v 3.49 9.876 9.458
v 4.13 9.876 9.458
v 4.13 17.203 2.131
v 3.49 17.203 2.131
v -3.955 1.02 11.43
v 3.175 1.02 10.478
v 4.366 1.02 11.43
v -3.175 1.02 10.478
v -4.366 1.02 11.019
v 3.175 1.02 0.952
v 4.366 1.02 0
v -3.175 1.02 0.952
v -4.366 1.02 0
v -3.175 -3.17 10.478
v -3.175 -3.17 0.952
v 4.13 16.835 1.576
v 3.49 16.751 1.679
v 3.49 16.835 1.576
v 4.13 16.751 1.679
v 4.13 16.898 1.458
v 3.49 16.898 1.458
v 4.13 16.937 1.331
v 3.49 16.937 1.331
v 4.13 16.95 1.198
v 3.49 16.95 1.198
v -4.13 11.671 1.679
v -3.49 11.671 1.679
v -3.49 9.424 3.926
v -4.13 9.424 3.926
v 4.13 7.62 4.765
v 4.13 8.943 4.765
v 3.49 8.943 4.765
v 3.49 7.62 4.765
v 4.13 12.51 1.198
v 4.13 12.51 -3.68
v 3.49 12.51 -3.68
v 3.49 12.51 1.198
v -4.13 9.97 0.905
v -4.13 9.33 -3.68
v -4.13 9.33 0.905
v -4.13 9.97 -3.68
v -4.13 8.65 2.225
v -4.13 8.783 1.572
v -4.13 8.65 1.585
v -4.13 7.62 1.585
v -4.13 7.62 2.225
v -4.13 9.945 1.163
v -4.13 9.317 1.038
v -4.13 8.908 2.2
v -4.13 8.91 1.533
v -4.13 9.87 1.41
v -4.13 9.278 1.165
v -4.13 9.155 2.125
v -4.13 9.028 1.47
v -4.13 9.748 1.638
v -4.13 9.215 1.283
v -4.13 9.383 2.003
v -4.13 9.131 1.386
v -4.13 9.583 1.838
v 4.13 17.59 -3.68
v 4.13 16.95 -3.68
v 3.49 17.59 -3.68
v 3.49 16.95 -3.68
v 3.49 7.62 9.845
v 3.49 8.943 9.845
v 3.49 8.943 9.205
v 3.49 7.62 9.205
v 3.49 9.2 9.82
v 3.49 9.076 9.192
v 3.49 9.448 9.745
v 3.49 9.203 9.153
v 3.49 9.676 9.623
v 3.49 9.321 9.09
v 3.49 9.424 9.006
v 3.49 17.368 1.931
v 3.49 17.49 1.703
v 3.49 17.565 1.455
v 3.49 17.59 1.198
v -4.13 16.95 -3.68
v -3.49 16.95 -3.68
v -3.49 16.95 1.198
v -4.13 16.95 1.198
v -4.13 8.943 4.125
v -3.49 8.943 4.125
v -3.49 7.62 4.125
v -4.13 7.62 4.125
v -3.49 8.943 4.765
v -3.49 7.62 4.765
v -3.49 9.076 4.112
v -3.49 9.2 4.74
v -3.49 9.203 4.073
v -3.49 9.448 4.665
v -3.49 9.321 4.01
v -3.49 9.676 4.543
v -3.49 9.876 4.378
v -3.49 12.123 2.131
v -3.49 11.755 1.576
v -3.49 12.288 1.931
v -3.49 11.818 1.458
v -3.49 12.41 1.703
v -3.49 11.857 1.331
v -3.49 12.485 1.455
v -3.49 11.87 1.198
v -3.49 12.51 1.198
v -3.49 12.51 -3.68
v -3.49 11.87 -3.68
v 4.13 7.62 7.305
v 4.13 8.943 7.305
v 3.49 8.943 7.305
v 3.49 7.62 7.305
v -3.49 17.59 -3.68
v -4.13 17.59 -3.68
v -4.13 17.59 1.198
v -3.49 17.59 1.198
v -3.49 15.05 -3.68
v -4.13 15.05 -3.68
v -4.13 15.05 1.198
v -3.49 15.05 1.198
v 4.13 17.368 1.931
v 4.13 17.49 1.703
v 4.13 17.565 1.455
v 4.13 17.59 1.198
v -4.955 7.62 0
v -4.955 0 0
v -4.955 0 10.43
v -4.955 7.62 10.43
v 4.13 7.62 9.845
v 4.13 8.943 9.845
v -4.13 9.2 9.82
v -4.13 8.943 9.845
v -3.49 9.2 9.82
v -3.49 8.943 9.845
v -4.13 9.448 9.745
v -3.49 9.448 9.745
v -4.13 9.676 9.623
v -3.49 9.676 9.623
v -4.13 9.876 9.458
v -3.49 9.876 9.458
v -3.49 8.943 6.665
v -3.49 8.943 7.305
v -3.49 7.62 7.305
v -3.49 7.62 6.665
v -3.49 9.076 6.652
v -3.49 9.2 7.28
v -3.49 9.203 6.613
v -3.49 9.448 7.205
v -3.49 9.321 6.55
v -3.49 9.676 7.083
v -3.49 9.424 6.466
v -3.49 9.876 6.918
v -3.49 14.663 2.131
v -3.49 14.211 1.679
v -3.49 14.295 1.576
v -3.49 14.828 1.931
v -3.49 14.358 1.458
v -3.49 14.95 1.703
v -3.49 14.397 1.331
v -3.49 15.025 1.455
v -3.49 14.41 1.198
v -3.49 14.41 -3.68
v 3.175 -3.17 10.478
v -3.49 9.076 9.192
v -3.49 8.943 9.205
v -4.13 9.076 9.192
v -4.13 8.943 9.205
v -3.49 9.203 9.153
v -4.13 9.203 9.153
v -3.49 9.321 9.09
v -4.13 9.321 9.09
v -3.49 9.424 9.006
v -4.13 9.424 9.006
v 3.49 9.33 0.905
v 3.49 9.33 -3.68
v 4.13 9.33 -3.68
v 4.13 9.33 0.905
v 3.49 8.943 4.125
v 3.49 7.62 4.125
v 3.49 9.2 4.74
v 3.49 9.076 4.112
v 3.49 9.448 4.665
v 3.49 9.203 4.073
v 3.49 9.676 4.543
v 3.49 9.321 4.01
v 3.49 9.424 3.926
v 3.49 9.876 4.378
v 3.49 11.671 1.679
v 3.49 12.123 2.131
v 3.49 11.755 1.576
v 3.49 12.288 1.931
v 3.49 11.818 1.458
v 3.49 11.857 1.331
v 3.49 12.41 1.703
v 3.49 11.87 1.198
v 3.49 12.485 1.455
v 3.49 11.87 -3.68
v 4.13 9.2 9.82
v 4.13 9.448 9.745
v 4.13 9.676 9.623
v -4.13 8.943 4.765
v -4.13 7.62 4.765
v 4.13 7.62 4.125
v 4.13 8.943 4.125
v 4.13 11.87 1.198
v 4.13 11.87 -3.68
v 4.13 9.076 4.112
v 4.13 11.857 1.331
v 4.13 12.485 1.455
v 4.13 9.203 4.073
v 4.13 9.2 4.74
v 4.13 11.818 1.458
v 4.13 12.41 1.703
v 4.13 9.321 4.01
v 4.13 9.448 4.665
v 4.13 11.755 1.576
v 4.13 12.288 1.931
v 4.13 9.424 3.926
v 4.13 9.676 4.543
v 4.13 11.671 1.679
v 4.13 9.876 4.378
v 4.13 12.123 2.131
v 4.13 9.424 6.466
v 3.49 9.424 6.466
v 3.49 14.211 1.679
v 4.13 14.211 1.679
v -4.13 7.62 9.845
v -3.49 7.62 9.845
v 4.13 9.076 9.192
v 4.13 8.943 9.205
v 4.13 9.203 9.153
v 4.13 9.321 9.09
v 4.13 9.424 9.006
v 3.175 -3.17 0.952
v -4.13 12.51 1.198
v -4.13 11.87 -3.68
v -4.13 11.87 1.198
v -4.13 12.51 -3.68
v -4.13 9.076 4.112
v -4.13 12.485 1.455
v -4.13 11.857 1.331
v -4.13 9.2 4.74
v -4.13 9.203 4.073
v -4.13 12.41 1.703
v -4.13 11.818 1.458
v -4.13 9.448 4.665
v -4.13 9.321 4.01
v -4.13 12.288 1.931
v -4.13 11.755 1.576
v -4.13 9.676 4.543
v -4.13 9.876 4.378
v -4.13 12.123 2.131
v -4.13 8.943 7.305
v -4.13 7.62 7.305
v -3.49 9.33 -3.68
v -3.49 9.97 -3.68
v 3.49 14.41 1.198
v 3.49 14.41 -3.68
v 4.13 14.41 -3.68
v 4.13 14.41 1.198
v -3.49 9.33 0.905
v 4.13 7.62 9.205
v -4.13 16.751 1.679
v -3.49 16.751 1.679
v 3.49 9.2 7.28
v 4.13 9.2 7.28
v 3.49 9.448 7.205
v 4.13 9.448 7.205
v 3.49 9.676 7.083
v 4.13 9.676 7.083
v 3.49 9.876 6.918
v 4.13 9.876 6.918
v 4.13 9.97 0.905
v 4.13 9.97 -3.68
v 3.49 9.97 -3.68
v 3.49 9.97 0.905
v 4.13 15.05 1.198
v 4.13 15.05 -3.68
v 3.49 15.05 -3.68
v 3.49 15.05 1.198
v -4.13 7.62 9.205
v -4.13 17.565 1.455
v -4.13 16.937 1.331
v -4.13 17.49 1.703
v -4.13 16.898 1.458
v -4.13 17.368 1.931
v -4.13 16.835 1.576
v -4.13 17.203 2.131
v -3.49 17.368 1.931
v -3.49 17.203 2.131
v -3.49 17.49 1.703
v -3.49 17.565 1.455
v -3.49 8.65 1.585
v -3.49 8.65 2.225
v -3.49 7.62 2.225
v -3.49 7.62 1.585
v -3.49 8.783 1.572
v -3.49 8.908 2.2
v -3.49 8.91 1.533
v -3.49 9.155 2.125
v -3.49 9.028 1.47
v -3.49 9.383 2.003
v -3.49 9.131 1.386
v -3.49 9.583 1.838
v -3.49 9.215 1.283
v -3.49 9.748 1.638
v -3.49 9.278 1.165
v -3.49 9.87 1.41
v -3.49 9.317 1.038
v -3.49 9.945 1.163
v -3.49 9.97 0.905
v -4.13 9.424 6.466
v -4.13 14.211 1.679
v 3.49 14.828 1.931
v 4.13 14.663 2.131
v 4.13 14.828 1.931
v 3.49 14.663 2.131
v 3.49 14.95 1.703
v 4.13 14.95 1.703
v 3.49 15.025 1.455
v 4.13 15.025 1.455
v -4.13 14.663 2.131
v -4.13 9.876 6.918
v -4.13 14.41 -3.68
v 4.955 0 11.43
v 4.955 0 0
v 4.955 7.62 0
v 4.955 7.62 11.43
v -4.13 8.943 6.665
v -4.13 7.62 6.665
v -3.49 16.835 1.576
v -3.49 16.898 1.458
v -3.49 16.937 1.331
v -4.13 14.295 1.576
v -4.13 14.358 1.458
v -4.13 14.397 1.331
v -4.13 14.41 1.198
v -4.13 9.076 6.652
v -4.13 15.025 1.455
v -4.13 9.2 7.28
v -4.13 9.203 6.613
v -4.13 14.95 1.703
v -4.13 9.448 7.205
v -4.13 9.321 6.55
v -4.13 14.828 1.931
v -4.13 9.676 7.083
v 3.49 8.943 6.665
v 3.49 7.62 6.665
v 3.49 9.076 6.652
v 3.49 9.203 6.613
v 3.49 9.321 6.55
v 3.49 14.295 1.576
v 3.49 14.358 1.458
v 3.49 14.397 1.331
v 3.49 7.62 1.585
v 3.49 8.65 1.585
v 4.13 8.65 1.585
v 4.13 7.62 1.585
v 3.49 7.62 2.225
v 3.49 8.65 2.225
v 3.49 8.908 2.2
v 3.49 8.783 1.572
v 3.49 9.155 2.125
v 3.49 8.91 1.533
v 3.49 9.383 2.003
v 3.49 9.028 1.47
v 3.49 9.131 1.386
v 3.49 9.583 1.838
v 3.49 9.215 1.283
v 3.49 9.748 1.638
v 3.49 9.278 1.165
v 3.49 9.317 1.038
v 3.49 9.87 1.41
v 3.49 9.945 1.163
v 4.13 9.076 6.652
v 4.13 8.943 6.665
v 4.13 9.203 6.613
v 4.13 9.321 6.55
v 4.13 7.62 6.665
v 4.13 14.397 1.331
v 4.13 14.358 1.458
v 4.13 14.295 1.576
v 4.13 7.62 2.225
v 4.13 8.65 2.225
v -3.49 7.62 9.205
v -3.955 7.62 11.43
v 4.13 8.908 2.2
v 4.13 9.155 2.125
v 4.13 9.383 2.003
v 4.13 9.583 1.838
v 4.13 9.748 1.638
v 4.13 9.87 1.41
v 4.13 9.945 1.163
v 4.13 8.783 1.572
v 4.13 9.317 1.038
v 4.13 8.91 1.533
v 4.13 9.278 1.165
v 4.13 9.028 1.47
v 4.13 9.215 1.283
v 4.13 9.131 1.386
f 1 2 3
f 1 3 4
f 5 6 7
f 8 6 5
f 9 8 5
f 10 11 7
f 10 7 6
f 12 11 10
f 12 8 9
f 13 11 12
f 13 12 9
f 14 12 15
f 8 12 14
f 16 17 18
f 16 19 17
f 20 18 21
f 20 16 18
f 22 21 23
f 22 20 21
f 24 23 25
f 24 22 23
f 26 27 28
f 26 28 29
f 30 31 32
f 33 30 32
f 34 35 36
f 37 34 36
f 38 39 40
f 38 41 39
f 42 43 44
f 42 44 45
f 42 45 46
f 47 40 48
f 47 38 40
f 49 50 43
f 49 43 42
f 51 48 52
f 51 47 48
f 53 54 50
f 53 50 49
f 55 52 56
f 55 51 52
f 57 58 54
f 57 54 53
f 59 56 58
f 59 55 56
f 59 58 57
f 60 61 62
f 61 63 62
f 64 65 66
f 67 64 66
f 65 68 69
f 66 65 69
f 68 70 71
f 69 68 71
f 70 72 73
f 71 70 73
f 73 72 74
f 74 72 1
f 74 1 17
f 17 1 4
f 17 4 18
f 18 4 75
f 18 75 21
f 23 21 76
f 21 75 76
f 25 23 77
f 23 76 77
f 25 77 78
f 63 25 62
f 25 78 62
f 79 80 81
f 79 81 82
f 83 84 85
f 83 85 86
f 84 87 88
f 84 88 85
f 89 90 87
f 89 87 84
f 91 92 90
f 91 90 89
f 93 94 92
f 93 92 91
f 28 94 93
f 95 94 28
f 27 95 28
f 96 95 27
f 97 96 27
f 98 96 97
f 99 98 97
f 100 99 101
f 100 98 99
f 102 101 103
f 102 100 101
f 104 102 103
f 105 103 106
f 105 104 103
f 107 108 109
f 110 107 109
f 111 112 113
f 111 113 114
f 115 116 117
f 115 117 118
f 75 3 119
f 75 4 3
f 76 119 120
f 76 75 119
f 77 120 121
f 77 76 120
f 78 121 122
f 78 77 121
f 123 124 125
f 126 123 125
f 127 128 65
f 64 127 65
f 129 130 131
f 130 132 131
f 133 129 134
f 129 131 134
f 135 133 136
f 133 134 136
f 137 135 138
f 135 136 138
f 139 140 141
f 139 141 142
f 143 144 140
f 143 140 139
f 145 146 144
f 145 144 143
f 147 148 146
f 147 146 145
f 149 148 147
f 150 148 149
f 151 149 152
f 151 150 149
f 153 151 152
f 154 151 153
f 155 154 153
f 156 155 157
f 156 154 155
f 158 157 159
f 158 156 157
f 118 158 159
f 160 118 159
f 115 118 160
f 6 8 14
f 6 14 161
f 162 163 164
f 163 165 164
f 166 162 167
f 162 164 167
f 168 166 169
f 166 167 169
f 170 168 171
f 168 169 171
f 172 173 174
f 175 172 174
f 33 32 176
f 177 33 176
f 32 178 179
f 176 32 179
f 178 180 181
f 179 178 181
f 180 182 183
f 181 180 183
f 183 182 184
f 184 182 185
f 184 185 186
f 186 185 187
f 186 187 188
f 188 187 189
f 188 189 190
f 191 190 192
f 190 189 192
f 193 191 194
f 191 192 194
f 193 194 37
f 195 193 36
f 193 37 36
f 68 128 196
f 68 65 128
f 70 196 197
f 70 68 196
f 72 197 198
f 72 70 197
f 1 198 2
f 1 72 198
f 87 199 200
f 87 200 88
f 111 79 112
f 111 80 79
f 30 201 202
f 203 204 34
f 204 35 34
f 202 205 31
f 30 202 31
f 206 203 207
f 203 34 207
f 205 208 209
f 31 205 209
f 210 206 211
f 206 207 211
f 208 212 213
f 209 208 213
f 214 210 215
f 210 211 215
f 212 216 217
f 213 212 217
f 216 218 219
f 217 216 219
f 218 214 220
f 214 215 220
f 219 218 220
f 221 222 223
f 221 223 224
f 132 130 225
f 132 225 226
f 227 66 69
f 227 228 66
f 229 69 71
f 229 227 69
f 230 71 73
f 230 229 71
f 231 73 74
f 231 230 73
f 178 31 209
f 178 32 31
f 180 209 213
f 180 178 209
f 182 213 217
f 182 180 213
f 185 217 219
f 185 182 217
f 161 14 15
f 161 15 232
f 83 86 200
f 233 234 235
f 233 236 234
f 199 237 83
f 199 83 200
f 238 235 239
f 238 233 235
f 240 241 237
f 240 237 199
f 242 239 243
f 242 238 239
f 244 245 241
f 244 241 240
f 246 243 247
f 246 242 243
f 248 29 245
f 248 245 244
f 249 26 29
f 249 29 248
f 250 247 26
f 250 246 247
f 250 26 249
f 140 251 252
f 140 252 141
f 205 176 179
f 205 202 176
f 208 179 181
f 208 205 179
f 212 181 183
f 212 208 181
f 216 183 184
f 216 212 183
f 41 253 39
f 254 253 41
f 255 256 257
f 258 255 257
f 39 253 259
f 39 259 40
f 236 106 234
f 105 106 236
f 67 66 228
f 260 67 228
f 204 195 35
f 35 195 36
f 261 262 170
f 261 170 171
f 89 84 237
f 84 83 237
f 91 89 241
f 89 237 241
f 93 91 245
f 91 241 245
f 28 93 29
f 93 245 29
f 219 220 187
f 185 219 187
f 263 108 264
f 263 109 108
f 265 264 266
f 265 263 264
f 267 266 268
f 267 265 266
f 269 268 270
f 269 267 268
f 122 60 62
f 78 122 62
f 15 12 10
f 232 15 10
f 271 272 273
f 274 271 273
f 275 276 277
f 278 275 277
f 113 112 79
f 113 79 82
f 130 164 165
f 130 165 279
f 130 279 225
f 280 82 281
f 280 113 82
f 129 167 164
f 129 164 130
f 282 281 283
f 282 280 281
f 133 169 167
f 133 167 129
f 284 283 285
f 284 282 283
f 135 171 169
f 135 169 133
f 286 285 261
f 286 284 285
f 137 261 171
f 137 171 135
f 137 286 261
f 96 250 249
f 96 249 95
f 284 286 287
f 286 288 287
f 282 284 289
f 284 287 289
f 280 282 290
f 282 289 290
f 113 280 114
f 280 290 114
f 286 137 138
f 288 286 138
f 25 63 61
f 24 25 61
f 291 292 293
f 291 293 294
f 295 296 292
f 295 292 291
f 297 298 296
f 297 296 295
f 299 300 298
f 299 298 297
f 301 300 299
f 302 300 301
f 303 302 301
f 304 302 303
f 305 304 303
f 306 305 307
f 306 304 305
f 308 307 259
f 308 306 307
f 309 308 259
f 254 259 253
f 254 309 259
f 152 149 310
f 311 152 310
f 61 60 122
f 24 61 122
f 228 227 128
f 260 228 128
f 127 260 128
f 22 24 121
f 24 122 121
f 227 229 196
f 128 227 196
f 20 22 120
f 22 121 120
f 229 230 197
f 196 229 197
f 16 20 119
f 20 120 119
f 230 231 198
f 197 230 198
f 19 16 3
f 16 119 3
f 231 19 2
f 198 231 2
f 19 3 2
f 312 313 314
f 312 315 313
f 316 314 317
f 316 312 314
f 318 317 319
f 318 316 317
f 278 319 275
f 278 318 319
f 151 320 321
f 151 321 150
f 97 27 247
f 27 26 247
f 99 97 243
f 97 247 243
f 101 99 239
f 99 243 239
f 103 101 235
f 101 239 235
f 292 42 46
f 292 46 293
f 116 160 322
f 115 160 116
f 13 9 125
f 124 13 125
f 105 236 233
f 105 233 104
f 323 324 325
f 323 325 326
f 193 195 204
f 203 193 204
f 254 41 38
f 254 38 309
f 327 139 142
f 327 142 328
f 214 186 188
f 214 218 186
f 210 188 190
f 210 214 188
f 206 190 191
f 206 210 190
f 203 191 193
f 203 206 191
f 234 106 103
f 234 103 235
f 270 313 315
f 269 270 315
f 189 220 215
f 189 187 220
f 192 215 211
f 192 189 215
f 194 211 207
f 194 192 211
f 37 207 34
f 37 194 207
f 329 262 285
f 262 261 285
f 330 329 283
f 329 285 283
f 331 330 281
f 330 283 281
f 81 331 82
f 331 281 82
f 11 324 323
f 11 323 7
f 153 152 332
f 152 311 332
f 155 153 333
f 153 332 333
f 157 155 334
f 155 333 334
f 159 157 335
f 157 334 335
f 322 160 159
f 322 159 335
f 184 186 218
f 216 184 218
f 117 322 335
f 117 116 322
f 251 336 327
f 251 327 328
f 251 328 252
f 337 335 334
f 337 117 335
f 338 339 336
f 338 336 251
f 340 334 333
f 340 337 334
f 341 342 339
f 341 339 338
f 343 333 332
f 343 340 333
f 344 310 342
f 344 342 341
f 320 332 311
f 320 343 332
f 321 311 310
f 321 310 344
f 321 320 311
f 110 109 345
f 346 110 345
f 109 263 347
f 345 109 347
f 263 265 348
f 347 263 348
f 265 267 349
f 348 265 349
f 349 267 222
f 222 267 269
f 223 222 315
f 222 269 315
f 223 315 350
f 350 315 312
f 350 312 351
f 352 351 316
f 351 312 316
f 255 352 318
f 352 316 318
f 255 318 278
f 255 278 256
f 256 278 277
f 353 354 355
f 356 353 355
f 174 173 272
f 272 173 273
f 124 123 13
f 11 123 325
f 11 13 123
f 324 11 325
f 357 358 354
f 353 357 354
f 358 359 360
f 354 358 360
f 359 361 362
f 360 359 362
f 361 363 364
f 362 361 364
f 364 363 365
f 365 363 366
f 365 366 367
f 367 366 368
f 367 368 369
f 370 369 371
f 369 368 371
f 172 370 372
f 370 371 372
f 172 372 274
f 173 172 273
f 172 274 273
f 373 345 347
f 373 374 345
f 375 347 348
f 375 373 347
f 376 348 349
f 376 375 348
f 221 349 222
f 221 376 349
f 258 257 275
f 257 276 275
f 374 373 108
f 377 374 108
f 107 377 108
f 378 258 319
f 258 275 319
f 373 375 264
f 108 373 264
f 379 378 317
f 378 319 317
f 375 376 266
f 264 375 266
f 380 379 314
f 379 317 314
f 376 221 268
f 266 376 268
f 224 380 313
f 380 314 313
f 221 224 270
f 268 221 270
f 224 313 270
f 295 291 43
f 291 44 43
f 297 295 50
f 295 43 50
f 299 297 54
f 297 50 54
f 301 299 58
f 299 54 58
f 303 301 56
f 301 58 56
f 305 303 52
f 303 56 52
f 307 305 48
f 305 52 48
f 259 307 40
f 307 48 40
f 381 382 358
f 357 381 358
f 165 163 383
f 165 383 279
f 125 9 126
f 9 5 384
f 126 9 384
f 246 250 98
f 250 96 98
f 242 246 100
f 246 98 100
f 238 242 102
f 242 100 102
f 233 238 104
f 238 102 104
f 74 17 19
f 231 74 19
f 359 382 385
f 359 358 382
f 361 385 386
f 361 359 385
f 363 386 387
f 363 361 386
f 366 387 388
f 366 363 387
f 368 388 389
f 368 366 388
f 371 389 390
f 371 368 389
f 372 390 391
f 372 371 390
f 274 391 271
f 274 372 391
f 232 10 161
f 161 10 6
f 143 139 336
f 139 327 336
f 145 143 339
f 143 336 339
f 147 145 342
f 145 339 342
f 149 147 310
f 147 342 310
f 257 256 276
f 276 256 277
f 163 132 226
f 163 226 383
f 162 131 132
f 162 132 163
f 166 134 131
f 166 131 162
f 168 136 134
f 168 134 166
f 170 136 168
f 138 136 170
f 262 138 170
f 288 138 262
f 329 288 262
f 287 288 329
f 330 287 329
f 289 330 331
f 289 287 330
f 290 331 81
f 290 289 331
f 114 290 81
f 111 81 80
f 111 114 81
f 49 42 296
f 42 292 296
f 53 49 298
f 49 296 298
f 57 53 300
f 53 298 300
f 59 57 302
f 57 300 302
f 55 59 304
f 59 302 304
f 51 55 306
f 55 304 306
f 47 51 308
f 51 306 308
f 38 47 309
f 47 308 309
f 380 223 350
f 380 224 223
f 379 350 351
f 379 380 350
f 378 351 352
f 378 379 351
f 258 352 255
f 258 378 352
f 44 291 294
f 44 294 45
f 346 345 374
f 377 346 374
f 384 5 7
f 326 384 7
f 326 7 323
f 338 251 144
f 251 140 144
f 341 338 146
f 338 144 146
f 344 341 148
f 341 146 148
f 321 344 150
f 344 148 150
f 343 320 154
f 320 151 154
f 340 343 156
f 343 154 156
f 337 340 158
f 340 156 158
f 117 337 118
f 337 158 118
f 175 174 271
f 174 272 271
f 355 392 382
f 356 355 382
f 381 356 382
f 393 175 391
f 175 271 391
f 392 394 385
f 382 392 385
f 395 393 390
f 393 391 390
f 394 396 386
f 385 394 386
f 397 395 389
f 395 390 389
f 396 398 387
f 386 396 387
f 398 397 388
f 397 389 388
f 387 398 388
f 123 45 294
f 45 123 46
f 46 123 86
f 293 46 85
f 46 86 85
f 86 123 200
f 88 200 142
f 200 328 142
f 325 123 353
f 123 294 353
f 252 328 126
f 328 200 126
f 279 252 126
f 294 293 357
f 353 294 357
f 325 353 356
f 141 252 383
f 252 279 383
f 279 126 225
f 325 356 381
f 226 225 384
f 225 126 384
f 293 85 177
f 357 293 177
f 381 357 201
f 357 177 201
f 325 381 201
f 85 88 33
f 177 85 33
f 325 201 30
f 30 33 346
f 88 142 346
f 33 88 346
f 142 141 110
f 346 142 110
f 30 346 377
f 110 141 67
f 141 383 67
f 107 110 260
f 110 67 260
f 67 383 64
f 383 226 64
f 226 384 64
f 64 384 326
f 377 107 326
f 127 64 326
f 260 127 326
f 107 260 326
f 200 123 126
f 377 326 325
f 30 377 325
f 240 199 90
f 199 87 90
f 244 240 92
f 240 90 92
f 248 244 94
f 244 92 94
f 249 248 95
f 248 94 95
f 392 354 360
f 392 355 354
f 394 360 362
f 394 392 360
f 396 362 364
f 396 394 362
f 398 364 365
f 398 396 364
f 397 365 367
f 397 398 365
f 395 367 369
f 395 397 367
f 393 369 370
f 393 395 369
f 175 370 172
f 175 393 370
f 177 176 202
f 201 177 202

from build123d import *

# Parameters (mm, degrees)
SKETCH_W     = 9.91
SKETCH_H     = 11.43
PAD_DEPTH    = 7.62
SKETCH002_W  = 0.64
SKETCH002_H  = 0.64
SKETCH004_W  = 0.64
SKETCH004_H  = 0.64
SKETCH006_W  = 0.64
SKETCH006_H  = 0.64
SKETCH008_W  = 0.64
SKETCH008_H  = 0.64
POCKET_DEPTH = 11.431
SKETCH010_W  = 6.35
SKETCH010_H  = 9.525
PAD001_DEPTH = 4.19
CHAMFER_SIZE = 1


with BuildPart() as part:
    # Sketch → Pad (new body)
    with BuildSketch(Plane.XZ):
        with Locations((0, 5.715)):
            Rectangle(SKETCH_W, SKETCH_H)
    extrude(amount=-PAD_DEPTH)

    # AdditivePipe: sweep along a path in Sketch001
    with BuildLine(Plane.YZ) as additivepipe_path:
        Line((0, 9.525), (8.942893, 9.525))
        ThreePointArc((8.942893, 9.525), (9.325577, 9.44888), (9.65, 9.232107))
        Line((9.65, 9.232107), (16.977107, 1.905))
        ThreePointArc((16.977107, 1.905), (17.19388, 1.580577), (17.27, 1.197893))
        Line((17.27, 1.197893), (17.27, -3.68))
    # Sketch002 → AdditivePipe (sweep)
    with BuildSketch(Plane.XZ):
        with Locations((3.81, 9.525)):
            Rectangle(SKETCH002_W, SKETCH002_H)
    additivepipe = sweep(path=additivepipe_path.line)

    # AdditivePipe001: sweep along a path in Sketch003
    with BuildLine(Plane.YZ) as additivepipe001_path:
        Line((0, 6.985), (8.942893, 6.985))
        ThreePointArc((8.942893, 6.985), (9.325577, 6.90888), (9.65, 6.692107))
        Line((9.65, 6.692107), (14.437107, 1.905))
        ThreePointArc((14.437107, 1.905), (14.65388, 1.580577), (14.73, 1.197893))
        Line((14.73, 1.197893), (14.73, -3.68))
    # Sketch004 → AdditivePipe001 (sweep)
    with BuildSketch(Plane.XZ):
        with Locations((3.81, 6.985)):
            Rectangle(SKETCH004_W, SKETCH004_H)
    additivepipe001 = sweep(path=additivepipe001_path.line)

    # AdditivePipe002: sweep along a path in Sketch005
    with BuildLine(Plane.YZ) as additivepipe002_path:
        Line((0, 4.445), (8.942893, 4.445))
        ThreePointArc((8.942893, 4.445), (9.325577, 4.36888), (9.65, 4.152107))
        Line((9.65, 4.152107), (11.897107, 1.905))
        ThreePointArc((11.897107, 1.905), (12.11388, 1.580577), (12.19, 1.197893))
        Line((12.19, 1.197893), (12.19, -3.68))
    # Sketch006 → AdditivePipe002 (sweep)
    with BuildSketch(Plane.XZ):
        with Locations((3.81, 4.445)):
            Rectangle(SKETCH006_W, SKETCH006_H)
    additivepipe002 = sweep(path=additivepipe002_path.line)

    # AdditivePipe003: sweep along a path in Sketch007
    with BuildLine(Plane.YZ) as additivepipe003_path:
        Line((0, 1.905), (8.65, 1.905))
        ThreePointArc((8.65, 1.905), (9.357107, 1.612107), (9.65, 0.905))
        Line((9.65, 0.905), (9.65, -3.68))
    # Sketch008 → AdditivePipe003 (sweep)
    with BuildSketch(Plane.XZ):
        with Locations((3.81, 1.905)):
            Rectangle(SKETCH008_W, SKETCH008_H)
    additivepipe003 = sweep(path=additivepipe003_path.line)

    # Mirrored: AdditivePipe, AdditivePipe001, AdditivePipe002, AdditivePipe003 across Sketch002 V_Axis
    add(additivepipe.mirror(Plane(origin=(0, 0, 0), x_dir=(0, -1, 0), z_dir=(1, 0, 0))))
    add(additivepipe001.mirror(Plane(origin=(0, 0, 0), x_dir=(0, -1, 0), z_dir=(1, 0, 0))))
    add(additivepipe002.mirror(Plane(origin=(0, 0, 0), x_dir=(0, -1, 0), z_dir=(1, 0, 0))))
    add(additivepipe003.mirror(Plane(origin=(0, 0, 0), x_dir=(0, -1, 0), z_dir=(1, 0, 0))))

    # Sketch009 (on Face3 of AdditivePipe002) → Pocket (cut, through all)
    with BuildSketch(Plane(origin=(0, 0, 0), x_dir=(1, 0, 0), z_dir=(0, 0, -1))):
        Polygon((-4.955, 0), (4.955, 0), (4.366103, -1.02), (-4.366103, -1.02), align=None)
    extrude(amount=-POCKET_DEPTH, mode=Mode.SUBTRACT)

    # Sketch010 (on Face7 of Pocket) → Pad001 (join)
    with BuildSketch(Plane.XZ.offset(-1.02)):
        with Locations((0, 5.715)):
            Rectangle(SKETCH010_W, SKETCH010_H)
    extrude(amount=PAD001_DEPTH)

    # Chamfer
    chamfer_edges = [part.edges().sort_by_distance(p)[0] for p in [
        (-4.955, 3.81, 11.43),
    ]]
    chamfer(chamfer_edges, length=CHAMFER_SIZE)


solid = part.part
